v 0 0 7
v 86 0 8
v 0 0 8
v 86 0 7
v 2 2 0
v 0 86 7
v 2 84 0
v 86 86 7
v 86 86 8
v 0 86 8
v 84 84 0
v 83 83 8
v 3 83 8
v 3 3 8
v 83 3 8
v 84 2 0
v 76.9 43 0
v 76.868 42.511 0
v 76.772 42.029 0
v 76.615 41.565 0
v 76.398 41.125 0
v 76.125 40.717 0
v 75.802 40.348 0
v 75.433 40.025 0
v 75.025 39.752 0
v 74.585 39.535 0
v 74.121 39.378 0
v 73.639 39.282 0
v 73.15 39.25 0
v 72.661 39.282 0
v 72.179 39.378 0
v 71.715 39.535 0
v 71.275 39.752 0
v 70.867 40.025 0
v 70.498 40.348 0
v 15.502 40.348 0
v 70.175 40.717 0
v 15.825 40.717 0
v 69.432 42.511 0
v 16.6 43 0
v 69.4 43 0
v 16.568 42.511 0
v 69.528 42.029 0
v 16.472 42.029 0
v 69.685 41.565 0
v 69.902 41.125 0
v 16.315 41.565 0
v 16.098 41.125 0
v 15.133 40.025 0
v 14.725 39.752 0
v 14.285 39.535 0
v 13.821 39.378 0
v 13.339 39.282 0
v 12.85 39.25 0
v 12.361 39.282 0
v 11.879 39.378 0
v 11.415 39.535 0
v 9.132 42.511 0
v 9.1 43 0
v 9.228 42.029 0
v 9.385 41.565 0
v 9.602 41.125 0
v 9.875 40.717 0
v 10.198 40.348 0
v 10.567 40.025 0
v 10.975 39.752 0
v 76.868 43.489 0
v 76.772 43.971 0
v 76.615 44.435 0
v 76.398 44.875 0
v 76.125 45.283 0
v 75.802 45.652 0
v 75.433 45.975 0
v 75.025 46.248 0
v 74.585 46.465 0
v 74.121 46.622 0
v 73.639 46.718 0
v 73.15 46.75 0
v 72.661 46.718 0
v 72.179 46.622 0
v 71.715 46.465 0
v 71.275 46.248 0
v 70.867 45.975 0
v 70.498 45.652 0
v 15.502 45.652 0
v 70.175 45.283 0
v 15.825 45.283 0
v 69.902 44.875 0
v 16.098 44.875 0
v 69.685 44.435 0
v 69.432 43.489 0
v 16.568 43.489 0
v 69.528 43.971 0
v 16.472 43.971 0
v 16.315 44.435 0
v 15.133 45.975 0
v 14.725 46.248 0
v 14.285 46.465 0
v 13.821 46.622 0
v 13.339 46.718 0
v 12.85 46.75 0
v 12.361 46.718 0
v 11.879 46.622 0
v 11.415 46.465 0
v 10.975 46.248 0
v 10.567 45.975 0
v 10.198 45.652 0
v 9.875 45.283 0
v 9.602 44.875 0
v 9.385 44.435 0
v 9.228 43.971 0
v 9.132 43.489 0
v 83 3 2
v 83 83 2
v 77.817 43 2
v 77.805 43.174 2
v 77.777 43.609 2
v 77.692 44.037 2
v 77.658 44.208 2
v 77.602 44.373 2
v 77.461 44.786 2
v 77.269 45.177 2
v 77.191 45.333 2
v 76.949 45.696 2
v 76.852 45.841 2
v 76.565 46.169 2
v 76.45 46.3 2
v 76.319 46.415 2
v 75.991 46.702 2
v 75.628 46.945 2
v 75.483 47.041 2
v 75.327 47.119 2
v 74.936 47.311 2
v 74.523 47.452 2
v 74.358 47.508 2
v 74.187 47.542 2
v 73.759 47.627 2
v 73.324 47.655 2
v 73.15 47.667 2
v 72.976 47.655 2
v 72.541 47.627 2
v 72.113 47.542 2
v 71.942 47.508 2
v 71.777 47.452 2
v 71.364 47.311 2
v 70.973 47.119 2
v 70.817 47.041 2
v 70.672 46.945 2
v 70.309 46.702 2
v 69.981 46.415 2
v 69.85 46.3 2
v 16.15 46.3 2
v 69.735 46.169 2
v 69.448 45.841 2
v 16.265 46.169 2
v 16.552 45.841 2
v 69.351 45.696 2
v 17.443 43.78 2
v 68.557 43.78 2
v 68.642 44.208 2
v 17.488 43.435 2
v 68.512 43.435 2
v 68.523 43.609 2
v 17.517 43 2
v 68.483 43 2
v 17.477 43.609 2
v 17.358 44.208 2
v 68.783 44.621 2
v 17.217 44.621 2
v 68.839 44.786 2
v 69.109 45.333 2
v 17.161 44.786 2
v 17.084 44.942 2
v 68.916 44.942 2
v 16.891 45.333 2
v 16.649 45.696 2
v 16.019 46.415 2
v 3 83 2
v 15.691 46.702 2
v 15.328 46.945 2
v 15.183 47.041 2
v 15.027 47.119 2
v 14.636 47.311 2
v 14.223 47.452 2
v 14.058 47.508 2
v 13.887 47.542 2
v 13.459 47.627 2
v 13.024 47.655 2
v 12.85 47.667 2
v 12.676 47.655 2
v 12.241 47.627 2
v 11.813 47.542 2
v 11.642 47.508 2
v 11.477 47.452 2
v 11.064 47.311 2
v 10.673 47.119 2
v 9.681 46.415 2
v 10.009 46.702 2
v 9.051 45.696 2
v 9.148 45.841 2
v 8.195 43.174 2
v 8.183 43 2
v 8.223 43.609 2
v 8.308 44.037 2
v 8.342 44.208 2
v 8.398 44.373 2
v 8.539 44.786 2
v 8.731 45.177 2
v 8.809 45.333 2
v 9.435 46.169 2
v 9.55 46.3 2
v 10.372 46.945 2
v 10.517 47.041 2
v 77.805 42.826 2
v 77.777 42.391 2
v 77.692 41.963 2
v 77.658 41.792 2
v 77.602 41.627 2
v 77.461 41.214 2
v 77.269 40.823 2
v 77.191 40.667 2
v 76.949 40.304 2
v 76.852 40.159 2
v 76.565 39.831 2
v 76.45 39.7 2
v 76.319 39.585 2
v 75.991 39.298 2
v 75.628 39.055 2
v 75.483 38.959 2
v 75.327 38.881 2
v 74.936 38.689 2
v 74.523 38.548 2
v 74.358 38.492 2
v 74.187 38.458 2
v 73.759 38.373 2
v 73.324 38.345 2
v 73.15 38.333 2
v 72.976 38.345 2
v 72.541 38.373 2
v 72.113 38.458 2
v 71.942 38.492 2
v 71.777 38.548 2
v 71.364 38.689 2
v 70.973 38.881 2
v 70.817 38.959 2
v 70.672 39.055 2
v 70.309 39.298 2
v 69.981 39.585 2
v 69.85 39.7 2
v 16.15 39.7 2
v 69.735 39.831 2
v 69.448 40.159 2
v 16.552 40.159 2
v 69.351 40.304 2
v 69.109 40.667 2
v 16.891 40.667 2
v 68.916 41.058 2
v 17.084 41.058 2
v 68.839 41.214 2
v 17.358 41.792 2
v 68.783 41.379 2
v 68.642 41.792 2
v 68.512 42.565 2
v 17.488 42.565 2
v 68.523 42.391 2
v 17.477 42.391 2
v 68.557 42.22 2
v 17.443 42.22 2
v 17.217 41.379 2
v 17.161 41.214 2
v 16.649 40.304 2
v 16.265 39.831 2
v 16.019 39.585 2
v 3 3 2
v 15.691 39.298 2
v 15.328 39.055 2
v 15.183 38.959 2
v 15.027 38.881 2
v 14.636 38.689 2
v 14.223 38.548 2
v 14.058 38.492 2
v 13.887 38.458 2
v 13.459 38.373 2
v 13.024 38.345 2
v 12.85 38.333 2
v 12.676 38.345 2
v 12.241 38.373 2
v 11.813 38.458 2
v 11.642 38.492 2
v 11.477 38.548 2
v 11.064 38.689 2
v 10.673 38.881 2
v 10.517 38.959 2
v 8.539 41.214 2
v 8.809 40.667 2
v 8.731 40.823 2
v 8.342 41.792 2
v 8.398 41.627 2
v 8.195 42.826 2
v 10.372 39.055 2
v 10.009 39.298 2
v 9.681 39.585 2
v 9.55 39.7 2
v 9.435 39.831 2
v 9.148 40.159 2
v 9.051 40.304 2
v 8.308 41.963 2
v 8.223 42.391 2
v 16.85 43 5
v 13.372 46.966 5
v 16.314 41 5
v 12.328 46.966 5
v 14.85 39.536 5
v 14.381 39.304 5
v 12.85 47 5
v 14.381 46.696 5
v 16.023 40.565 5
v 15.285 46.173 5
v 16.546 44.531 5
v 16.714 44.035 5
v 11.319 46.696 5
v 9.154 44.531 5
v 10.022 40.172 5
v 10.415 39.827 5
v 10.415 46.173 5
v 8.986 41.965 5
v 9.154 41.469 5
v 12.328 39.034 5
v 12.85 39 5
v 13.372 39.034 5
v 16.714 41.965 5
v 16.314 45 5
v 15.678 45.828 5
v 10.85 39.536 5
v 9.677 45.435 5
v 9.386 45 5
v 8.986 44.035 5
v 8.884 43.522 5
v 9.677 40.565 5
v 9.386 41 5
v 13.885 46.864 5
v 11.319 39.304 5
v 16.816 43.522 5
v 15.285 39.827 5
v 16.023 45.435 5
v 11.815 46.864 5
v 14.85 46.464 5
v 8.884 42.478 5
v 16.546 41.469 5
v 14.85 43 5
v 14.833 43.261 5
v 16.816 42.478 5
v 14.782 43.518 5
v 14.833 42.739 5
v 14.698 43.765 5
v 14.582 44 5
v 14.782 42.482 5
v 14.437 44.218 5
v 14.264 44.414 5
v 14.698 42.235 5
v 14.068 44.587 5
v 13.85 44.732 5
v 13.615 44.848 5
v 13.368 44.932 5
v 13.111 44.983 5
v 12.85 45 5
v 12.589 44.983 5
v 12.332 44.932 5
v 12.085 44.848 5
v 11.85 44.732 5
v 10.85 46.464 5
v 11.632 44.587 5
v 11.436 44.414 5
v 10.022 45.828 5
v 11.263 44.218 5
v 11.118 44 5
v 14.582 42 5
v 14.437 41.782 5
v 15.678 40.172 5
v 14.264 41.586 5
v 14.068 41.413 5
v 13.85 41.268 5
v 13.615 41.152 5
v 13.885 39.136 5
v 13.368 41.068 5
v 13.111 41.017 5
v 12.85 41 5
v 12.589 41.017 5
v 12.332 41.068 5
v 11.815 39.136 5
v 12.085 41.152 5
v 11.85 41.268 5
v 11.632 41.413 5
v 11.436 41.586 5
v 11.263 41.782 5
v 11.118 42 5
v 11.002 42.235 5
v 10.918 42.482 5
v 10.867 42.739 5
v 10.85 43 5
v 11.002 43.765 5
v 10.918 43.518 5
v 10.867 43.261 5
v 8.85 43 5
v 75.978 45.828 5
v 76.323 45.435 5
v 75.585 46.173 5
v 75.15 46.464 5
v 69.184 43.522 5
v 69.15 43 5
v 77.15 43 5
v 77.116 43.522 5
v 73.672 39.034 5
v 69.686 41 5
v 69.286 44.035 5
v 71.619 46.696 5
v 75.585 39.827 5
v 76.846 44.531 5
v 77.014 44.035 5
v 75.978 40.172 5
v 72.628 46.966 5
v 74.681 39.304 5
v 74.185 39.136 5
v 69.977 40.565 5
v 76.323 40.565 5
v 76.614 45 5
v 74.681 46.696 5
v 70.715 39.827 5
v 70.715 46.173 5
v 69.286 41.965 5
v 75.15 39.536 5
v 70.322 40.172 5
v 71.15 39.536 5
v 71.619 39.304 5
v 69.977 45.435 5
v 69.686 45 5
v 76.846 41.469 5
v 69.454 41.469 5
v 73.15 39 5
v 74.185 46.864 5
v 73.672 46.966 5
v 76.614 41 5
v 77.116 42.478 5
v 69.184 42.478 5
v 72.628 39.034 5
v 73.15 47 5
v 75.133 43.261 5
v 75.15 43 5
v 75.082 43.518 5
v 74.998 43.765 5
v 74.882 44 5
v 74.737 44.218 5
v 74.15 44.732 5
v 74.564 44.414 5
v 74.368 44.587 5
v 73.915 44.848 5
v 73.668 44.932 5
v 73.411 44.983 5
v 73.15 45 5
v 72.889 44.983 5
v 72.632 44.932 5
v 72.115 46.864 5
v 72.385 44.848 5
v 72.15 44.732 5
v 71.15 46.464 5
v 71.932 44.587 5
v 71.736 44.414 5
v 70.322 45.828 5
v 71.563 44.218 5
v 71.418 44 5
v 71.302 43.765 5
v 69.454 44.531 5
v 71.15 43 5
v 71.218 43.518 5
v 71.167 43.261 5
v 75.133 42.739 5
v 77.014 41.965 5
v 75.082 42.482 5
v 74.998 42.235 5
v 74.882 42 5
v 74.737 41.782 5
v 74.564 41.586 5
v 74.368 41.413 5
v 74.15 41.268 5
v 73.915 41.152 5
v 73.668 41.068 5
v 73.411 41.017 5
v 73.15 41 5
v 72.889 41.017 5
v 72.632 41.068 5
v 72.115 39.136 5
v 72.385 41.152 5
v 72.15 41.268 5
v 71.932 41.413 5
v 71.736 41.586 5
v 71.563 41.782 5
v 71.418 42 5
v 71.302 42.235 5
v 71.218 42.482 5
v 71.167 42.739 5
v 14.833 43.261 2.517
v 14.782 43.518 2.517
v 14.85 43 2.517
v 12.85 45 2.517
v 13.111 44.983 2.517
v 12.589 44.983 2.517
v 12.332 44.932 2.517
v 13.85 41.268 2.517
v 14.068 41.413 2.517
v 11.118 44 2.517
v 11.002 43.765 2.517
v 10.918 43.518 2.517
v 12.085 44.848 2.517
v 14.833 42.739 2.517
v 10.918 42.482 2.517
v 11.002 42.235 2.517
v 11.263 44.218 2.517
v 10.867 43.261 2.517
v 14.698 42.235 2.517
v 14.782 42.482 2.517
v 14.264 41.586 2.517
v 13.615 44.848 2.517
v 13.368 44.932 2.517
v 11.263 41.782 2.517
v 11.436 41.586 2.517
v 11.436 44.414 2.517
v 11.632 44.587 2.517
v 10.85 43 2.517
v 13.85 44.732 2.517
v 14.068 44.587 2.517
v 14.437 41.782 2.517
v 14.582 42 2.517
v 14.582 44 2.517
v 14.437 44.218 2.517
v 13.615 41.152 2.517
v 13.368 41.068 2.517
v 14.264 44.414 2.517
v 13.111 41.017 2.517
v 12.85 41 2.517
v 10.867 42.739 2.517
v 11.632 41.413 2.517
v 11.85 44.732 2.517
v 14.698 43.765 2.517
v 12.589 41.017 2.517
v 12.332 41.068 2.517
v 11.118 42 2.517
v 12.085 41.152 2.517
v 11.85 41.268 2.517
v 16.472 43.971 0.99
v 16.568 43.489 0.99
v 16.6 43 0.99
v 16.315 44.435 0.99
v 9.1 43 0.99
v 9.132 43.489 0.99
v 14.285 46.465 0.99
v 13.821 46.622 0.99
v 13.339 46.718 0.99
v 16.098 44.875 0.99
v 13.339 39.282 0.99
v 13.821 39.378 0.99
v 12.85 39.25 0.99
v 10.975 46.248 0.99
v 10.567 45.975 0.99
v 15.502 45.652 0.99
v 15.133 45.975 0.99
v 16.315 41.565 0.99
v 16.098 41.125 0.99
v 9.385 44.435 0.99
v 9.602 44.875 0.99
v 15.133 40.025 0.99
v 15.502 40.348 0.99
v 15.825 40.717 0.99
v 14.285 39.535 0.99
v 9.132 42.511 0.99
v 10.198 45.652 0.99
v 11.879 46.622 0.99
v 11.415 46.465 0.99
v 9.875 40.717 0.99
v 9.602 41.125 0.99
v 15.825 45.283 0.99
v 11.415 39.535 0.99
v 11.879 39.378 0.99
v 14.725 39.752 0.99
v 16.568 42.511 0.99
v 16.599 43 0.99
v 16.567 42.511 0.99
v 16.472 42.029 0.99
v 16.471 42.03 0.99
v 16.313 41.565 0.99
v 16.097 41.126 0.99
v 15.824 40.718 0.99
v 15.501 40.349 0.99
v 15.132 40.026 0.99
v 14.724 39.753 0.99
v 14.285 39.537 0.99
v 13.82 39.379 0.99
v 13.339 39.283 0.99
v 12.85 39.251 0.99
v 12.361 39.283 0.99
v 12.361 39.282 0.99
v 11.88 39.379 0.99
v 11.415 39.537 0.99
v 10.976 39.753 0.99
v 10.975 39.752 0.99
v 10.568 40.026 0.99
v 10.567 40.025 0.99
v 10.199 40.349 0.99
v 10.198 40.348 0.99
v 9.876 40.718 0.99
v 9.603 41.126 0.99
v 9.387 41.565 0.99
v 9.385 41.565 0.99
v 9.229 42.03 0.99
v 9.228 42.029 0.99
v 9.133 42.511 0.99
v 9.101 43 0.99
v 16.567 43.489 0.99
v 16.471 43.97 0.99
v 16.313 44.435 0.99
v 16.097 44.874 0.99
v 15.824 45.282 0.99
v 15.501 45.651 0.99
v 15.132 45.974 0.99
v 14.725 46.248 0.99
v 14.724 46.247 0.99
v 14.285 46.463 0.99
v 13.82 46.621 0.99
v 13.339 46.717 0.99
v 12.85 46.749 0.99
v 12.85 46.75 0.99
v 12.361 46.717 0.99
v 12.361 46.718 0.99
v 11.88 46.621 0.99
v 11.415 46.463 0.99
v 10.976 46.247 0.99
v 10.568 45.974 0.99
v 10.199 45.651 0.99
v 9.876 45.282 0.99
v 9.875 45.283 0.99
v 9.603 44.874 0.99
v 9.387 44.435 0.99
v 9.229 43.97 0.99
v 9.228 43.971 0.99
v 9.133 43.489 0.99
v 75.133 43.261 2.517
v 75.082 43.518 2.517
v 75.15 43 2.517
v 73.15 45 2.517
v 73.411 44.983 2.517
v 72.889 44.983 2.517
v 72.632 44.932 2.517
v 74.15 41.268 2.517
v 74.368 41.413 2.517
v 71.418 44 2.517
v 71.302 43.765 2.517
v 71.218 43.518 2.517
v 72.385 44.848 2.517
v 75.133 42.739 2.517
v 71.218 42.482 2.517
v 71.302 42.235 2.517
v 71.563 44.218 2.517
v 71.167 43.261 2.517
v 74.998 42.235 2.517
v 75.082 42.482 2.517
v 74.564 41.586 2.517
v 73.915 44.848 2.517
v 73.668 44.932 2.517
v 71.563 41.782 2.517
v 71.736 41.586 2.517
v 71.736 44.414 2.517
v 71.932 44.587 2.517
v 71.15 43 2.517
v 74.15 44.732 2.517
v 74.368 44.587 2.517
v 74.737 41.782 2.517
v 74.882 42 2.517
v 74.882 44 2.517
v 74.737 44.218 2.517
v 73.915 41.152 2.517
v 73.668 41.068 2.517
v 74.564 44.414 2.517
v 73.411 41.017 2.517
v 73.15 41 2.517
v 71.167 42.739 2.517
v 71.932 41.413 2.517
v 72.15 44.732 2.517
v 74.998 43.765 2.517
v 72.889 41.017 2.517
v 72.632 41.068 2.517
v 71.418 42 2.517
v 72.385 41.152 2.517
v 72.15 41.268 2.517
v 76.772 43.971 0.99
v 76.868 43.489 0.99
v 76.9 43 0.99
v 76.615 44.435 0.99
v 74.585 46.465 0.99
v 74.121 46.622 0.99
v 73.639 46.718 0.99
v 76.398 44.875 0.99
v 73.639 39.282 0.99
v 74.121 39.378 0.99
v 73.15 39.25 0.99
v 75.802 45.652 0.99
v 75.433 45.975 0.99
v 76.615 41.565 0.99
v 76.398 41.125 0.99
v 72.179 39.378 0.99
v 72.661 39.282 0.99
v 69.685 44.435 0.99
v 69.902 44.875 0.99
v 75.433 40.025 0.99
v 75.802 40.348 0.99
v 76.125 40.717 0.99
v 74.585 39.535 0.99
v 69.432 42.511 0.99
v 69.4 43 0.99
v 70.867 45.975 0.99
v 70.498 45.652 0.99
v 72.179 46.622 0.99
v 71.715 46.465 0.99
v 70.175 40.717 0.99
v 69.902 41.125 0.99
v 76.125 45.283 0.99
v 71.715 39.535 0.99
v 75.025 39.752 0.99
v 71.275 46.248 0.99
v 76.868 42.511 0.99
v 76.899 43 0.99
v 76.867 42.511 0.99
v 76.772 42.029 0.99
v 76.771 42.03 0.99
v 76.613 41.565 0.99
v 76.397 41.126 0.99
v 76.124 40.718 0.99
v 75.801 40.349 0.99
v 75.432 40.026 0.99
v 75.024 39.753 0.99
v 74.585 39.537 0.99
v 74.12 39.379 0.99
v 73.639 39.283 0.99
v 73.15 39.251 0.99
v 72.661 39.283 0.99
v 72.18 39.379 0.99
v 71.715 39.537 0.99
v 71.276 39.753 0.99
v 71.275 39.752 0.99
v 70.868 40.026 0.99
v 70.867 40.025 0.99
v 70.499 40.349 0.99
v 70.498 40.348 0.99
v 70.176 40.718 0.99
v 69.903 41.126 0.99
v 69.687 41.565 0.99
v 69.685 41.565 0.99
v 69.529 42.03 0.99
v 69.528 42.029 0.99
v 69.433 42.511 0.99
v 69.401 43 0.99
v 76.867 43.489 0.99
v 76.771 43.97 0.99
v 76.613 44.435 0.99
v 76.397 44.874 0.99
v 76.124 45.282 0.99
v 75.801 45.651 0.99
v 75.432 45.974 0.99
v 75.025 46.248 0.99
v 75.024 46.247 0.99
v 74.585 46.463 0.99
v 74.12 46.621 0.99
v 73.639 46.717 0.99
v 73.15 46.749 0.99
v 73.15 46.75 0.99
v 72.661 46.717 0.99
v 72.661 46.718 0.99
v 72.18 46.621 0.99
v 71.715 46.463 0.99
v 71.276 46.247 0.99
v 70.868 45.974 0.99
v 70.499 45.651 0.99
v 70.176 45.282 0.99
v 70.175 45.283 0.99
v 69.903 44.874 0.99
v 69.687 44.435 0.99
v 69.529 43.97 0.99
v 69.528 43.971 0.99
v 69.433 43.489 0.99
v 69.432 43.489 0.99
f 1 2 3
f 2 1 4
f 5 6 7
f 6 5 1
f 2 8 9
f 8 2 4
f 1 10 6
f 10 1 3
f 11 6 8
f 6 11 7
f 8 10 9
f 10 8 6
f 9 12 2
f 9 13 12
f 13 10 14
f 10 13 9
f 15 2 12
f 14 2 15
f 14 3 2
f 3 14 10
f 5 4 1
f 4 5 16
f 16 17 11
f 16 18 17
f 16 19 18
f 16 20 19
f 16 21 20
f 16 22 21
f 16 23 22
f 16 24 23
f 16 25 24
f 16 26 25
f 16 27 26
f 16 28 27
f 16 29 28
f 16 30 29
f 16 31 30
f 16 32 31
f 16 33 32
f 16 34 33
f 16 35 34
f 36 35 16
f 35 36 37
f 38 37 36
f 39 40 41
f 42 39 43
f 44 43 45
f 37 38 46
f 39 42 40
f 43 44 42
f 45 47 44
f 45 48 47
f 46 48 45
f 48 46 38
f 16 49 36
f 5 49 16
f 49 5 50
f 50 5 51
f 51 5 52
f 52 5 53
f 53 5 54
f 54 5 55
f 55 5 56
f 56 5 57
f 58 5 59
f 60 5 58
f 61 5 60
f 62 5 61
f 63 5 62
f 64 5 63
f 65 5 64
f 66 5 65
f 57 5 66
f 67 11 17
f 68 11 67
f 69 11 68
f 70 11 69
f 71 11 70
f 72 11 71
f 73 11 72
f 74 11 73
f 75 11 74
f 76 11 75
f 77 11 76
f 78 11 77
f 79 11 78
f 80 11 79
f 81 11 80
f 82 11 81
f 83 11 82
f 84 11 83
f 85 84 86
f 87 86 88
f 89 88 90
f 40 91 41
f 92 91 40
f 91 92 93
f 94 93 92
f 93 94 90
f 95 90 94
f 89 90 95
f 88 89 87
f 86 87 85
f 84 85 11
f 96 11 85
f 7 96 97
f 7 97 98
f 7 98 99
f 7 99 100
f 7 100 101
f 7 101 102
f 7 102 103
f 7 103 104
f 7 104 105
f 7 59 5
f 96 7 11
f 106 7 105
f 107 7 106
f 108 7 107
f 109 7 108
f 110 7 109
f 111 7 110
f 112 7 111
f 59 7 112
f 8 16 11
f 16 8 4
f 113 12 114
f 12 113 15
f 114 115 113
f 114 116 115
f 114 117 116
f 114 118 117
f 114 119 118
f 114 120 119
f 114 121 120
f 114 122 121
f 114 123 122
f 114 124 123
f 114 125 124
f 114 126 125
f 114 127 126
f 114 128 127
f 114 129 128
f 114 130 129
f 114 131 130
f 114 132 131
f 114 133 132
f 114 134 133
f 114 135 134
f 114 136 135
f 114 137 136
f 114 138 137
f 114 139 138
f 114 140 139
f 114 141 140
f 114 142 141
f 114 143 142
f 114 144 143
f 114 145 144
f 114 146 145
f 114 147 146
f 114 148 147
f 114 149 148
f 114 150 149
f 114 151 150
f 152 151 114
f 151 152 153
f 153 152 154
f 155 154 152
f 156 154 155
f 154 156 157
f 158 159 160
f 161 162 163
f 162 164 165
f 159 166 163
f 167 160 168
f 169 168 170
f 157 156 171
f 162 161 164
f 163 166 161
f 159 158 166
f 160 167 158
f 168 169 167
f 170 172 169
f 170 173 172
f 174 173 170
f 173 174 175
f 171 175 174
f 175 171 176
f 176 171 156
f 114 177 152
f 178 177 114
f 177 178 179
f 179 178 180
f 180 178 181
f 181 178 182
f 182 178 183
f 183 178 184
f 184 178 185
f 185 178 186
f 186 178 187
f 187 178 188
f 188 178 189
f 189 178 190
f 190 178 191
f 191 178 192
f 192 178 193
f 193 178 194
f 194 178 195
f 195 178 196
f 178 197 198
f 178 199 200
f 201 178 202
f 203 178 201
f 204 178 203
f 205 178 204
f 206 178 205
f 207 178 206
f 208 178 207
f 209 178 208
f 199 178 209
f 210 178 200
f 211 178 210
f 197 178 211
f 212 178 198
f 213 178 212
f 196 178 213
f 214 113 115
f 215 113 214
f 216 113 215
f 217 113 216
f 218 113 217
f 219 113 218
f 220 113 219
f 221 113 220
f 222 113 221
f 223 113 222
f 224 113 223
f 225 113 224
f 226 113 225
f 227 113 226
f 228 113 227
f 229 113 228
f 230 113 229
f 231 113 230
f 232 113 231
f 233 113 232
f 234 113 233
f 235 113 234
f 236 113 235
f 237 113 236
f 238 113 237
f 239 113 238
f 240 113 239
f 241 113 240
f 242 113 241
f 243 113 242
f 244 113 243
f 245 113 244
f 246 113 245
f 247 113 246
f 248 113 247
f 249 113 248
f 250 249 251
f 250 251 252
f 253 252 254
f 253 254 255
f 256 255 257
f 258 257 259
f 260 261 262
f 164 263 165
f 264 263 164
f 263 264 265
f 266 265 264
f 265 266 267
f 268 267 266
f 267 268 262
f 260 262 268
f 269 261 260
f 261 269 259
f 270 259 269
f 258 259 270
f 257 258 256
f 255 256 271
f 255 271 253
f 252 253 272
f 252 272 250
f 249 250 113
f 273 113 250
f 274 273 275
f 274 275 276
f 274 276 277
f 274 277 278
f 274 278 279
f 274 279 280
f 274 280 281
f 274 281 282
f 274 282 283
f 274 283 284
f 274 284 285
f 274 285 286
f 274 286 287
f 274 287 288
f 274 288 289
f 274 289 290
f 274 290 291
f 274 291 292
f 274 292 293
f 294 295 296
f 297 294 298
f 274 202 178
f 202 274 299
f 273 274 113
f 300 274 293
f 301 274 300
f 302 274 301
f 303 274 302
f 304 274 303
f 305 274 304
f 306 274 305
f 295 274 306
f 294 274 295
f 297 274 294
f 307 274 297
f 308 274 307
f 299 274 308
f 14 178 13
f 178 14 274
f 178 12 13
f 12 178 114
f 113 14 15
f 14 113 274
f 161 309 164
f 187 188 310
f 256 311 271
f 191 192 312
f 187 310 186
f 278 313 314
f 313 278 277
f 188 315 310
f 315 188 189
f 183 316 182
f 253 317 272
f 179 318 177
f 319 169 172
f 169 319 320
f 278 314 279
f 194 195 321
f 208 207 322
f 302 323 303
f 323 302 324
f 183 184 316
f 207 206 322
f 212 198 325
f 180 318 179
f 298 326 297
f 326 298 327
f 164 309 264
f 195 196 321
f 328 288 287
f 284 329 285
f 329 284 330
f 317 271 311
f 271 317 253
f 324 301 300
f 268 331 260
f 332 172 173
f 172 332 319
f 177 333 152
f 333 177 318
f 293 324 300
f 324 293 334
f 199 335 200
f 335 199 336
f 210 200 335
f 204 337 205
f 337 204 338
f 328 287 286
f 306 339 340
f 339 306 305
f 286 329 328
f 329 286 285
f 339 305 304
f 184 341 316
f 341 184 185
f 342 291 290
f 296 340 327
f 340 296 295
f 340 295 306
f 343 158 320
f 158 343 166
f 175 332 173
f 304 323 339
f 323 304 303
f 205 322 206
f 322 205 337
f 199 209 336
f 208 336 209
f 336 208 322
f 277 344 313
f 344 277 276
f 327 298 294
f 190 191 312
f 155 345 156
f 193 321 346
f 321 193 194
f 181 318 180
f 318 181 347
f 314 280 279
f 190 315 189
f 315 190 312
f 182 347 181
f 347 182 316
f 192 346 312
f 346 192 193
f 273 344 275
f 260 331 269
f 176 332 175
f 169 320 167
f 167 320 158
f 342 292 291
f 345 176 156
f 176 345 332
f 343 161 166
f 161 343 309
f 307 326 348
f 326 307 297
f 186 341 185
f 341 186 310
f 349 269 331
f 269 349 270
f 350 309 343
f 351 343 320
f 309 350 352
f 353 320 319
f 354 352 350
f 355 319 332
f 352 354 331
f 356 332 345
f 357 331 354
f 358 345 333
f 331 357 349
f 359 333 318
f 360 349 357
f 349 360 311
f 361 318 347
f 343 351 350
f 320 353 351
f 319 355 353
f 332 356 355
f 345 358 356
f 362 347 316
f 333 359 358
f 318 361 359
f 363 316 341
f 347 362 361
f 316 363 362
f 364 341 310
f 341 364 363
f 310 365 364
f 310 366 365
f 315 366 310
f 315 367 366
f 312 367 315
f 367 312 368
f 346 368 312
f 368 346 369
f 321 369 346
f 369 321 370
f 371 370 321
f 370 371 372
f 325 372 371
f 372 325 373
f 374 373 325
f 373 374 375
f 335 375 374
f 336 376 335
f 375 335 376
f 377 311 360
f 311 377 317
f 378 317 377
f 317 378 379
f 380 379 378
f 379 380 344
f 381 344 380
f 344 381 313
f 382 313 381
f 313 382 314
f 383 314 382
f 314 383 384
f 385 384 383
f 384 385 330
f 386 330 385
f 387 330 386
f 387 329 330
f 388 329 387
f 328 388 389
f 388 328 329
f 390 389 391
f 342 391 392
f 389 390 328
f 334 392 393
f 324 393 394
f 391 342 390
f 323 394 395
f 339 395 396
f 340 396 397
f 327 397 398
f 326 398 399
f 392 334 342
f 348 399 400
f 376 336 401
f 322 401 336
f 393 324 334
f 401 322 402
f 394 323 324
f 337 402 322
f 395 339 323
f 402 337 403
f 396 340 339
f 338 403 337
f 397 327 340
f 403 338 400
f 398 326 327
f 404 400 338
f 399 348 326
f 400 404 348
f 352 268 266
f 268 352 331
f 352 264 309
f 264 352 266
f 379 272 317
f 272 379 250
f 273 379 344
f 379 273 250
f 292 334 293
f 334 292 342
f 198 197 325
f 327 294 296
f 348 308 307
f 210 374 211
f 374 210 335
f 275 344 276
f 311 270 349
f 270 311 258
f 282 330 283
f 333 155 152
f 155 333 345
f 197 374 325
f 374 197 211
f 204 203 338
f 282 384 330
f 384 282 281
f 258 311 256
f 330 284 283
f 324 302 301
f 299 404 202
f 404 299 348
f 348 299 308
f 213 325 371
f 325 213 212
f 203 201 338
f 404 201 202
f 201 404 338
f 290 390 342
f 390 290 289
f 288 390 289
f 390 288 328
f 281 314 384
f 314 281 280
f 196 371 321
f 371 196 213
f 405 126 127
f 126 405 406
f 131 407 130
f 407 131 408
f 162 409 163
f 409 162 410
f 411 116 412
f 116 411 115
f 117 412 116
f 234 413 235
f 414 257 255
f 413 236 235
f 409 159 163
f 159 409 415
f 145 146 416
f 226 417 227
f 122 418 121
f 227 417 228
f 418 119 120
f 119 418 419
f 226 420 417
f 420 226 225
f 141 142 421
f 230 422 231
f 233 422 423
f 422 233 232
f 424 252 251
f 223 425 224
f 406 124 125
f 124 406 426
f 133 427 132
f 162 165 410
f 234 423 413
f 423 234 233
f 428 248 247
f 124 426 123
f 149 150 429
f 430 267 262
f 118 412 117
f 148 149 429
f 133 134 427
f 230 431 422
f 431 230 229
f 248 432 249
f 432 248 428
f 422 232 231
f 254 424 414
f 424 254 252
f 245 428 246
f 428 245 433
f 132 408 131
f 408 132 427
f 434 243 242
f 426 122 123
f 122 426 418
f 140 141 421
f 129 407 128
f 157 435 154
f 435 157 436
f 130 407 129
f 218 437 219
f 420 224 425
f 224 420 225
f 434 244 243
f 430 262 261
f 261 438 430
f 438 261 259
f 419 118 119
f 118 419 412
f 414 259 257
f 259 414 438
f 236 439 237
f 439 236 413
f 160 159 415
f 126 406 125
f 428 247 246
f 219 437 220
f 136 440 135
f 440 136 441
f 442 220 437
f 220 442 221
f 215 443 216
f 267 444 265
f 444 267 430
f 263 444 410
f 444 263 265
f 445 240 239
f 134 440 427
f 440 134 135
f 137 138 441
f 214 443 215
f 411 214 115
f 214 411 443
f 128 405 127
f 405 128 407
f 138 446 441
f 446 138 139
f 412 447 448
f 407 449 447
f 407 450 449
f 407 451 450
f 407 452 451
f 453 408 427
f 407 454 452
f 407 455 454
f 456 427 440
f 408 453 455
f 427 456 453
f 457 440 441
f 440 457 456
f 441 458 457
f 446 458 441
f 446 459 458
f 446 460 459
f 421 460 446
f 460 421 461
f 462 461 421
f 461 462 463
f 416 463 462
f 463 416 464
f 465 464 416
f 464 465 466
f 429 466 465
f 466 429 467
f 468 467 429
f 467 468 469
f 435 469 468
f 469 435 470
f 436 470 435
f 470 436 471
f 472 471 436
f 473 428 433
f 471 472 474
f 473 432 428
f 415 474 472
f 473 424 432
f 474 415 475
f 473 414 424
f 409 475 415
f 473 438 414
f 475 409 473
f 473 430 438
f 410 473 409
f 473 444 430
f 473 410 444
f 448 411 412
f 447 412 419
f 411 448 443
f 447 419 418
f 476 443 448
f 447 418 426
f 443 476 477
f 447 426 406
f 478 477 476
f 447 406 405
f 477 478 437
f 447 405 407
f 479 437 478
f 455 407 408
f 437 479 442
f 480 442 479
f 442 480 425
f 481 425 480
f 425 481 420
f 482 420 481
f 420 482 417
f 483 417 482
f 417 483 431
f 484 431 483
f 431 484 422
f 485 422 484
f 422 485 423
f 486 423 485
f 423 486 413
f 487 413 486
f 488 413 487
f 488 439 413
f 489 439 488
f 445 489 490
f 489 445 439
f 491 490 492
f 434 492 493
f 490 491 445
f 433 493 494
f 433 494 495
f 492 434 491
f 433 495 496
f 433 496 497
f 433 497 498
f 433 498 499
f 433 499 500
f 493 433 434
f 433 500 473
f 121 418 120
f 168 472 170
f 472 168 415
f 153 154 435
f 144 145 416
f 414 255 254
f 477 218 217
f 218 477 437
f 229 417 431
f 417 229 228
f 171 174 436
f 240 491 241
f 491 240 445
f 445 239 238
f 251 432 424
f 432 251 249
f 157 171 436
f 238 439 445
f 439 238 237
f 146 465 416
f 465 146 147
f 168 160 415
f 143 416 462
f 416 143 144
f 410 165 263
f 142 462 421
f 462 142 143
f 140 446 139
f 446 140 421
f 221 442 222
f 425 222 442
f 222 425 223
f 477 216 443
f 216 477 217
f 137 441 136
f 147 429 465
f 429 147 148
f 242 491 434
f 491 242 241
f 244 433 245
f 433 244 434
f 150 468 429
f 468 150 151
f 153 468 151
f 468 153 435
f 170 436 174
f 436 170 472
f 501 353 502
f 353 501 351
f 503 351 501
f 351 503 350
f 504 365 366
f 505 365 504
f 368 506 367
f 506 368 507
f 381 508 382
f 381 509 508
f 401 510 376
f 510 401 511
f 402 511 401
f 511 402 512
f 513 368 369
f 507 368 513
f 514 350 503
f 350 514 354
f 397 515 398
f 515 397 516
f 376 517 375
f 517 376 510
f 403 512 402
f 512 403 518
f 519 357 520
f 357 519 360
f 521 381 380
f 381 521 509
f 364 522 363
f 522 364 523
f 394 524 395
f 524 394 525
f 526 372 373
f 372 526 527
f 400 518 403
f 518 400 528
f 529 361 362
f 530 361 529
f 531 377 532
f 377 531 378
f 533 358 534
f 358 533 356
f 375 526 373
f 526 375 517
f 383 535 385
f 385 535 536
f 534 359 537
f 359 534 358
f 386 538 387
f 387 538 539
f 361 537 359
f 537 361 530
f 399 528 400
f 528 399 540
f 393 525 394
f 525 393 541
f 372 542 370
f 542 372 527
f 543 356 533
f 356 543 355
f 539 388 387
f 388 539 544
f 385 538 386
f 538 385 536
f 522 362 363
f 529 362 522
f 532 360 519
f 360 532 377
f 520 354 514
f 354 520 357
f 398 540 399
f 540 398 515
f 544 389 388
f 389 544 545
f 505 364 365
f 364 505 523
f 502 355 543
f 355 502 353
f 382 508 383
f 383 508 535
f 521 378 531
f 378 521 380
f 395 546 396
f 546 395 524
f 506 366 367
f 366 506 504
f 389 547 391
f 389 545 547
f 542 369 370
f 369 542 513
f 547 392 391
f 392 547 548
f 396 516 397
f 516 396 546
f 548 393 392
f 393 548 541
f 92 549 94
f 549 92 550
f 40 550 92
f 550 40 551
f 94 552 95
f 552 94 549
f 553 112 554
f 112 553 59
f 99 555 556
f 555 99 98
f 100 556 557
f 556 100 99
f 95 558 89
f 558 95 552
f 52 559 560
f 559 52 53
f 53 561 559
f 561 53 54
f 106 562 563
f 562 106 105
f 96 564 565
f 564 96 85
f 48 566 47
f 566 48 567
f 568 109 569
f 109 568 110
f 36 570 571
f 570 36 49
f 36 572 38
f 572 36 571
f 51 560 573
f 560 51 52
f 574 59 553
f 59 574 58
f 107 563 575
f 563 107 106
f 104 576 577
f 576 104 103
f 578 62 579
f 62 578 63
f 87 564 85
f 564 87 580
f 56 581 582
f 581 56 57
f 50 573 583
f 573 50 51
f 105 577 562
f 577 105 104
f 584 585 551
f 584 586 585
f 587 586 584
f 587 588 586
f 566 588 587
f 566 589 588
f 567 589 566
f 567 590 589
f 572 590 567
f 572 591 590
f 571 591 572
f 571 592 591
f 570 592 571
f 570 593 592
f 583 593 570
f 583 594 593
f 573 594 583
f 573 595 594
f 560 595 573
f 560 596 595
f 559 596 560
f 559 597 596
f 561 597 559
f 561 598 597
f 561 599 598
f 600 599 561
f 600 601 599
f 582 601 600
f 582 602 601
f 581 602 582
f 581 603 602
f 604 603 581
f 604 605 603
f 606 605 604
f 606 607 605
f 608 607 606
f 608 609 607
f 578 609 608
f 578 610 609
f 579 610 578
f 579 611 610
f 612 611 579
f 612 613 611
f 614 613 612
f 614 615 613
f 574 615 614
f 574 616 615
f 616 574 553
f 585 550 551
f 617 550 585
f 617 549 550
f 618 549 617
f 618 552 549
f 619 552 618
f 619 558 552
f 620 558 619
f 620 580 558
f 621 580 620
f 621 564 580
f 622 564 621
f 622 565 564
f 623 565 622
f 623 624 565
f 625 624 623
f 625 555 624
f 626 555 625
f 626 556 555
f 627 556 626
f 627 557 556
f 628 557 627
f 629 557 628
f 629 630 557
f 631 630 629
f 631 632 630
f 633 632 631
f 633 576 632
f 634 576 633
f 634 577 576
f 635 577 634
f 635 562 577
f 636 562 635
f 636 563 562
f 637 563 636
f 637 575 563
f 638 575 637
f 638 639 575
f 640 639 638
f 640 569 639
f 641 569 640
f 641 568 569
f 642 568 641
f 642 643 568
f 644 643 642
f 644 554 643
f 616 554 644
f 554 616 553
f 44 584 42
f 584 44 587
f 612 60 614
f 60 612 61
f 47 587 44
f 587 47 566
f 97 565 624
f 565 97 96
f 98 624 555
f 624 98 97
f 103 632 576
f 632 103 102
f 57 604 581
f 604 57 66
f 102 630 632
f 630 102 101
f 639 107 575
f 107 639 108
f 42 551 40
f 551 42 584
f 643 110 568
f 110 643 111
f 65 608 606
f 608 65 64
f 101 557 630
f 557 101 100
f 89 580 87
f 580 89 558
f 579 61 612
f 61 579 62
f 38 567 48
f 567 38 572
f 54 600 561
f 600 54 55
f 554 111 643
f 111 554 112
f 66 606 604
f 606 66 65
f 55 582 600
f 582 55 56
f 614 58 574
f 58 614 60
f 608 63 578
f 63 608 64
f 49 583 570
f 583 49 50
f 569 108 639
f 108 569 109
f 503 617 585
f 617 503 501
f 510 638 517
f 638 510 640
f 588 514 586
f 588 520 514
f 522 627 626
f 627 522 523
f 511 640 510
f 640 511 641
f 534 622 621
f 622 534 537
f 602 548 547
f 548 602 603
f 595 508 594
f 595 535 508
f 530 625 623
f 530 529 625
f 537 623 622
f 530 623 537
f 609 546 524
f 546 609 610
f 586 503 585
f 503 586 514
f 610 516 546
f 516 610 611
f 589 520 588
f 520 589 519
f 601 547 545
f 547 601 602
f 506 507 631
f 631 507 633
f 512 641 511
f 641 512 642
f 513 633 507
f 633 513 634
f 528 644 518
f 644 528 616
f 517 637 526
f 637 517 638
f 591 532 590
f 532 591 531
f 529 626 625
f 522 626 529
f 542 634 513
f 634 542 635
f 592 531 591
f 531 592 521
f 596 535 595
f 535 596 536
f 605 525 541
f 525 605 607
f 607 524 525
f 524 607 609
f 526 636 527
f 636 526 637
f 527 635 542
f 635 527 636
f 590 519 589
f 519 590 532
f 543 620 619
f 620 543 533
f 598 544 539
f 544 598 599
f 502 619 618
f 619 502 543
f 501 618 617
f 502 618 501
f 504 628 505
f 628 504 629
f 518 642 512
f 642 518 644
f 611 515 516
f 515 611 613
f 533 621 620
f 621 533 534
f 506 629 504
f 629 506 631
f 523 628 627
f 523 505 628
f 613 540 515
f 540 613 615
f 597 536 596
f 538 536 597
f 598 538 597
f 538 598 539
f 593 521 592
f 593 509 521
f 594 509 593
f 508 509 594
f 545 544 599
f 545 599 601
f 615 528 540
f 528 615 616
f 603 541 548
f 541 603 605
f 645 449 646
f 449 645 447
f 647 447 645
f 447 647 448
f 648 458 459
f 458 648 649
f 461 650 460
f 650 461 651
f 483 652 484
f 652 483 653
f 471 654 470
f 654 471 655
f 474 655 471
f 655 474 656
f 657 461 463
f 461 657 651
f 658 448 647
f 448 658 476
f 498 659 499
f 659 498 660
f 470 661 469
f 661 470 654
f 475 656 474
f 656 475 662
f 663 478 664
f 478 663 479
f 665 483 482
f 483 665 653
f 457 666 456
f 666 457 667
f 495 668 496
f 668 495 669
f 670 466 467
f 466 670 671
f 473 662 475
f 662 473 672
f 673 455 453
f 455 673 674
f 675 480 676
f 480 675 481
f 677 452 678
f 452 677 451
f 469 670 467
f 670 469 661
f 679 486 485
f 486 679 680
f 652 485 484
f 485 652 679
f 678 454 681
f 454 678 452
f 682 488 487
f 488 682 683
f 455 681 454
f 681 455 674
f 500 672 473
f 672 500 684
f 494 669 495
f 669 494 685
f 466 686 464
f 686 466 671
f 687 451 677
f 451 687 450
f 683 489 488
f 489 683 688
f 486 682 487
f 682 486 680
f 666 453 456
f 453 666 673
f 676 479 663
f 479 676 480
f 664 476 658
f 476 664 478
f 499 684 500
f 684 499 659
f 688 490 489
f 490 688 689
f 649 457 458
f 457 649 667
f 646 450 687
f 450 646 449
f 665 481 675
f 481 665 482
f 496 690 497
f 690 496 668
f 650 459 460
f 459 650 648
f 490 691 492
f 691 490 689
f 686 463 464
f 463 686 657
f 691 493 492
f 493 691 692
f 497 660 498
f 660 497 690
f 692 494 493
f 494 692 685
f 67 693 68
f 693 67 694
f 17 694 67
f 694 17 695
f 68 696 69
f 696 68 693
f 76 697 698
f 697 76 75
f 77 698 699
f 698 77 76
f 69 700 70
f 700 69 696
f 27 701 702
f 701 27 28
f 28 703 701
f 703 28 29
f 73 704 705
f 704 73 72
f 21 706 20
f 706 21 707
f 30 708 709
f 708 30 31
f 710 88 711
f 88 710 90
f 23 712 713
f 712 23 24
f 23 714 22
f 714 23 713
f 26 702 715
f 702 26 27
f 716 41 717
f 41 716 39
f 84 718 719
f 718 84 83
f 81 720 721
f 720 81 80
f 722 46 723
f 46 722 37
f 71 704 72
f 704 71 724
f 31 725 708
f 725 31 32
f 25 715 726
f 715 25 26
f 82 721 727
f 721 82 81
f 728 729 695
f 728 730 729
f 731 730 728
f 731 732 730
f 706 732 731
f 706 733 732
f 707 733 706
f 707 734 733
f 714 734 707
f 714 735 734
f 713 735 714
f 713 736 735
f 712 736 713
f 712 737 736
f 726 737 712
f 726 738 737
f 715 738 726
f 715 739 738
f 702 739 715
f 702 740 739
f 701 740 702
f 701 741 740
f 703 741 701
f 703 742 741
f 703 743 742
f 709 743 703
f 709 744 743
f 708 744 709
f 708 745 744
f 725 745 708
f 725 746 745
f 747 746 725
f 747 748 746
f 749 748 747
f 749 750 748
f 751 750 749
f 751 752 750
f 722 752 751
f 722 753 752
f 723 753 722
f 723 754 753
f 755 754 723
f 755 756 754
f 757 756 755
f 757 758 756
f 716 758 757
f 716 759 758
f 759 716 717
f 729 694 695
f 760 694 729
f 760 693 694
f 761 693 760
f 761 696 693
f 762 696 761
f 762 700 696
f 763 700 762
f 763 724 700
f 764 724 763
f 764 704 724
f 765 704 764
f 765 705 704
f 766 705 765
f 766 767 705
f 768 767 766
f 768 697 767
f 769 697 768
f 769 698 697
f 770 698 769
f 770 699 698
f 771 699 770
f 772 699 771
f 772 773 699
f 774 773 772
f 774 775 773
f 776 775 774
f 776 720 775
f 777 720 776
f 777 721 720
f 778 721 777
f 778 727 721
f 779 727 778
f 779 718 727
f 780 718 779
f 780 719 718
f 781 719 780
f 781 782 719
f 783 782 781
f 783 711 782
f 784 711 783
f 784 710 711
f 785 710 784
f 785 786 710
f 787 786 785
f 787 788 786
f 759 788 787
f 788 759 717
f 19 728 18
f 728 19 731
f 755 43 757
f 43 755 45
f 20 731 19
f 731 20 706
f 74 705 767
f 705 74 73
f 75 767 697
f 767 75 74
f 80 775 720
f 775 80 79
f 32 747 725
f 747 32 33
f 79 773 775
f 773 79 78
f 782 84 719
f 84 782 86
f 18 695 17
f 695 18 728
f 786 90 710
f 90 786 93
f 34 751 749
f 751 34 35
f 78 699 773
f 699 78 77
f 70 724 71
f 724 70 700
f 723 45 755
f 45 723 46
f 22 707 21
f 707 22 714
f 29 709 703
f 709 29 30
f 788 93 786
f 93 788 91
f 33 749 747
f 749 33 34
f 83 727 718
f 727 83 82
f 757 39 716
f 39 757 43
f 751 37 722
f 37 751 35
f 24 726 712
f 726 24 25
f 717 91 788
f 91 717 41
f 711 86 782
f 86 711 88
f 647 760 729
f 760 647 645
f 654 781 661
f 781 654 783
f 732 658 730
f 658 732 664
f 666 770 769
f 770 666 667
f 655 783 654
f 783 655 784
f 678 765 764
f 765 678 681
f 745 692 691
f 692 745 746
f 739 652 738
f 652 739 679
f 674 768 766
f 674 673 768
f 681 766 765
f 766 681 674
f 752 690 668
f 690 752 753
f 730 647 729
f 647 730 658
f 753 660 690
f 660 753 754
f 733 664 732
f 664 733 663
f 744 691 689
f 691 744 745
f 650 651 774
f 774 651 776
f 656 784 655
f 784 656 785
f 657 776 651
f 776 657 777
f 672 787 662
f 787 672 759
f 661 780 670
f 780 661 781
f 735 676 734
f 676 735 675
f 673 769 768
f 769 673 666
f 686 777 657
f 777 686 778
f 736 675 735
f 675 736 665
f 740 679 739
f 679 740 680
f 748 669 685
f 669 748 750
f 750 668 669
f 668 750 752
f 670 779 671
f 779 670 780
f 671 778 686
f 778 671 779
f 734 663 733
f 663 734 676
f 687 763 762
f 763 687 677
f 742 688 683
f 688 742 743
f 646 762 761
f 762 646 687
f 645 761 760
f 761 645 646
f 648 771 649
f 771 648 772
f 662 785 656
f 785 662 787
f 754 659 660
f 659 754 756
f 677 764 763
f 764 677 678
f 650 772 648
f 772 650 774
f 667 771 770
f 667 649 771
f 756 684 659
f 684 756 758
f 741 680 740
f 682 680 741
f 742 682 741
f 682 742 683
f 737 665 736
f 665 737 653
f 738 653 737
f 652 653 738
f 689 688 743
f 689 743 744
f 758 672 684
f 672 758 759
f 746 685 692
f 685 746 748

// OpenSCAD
difference()
{
	union()
	{
		difference()
		{
			hull()
			{
				translate([2,2,0])cube([82,82,1]);
				translate([0,0,7])cube([86,86,1]);
			}
			translate([3,3,2])cube([80,80,10]);
		}
		for(x=[12.85,73.15])translate([x,43,0.5])cylinder(d1=10,d2=8,h=4.5,$fn=48);
	}
	for(x=[12.85,73.15])translate([x,43,-0.01])
	{
		cylinder(d=4,h=10,$fn=48);
		cylinder(d=7.5,h=1,$fn=48);
		translate([0,0,0.999])cylinder(d1=7.5,d2=0,h=3.275,$fn=48);
	}
}
